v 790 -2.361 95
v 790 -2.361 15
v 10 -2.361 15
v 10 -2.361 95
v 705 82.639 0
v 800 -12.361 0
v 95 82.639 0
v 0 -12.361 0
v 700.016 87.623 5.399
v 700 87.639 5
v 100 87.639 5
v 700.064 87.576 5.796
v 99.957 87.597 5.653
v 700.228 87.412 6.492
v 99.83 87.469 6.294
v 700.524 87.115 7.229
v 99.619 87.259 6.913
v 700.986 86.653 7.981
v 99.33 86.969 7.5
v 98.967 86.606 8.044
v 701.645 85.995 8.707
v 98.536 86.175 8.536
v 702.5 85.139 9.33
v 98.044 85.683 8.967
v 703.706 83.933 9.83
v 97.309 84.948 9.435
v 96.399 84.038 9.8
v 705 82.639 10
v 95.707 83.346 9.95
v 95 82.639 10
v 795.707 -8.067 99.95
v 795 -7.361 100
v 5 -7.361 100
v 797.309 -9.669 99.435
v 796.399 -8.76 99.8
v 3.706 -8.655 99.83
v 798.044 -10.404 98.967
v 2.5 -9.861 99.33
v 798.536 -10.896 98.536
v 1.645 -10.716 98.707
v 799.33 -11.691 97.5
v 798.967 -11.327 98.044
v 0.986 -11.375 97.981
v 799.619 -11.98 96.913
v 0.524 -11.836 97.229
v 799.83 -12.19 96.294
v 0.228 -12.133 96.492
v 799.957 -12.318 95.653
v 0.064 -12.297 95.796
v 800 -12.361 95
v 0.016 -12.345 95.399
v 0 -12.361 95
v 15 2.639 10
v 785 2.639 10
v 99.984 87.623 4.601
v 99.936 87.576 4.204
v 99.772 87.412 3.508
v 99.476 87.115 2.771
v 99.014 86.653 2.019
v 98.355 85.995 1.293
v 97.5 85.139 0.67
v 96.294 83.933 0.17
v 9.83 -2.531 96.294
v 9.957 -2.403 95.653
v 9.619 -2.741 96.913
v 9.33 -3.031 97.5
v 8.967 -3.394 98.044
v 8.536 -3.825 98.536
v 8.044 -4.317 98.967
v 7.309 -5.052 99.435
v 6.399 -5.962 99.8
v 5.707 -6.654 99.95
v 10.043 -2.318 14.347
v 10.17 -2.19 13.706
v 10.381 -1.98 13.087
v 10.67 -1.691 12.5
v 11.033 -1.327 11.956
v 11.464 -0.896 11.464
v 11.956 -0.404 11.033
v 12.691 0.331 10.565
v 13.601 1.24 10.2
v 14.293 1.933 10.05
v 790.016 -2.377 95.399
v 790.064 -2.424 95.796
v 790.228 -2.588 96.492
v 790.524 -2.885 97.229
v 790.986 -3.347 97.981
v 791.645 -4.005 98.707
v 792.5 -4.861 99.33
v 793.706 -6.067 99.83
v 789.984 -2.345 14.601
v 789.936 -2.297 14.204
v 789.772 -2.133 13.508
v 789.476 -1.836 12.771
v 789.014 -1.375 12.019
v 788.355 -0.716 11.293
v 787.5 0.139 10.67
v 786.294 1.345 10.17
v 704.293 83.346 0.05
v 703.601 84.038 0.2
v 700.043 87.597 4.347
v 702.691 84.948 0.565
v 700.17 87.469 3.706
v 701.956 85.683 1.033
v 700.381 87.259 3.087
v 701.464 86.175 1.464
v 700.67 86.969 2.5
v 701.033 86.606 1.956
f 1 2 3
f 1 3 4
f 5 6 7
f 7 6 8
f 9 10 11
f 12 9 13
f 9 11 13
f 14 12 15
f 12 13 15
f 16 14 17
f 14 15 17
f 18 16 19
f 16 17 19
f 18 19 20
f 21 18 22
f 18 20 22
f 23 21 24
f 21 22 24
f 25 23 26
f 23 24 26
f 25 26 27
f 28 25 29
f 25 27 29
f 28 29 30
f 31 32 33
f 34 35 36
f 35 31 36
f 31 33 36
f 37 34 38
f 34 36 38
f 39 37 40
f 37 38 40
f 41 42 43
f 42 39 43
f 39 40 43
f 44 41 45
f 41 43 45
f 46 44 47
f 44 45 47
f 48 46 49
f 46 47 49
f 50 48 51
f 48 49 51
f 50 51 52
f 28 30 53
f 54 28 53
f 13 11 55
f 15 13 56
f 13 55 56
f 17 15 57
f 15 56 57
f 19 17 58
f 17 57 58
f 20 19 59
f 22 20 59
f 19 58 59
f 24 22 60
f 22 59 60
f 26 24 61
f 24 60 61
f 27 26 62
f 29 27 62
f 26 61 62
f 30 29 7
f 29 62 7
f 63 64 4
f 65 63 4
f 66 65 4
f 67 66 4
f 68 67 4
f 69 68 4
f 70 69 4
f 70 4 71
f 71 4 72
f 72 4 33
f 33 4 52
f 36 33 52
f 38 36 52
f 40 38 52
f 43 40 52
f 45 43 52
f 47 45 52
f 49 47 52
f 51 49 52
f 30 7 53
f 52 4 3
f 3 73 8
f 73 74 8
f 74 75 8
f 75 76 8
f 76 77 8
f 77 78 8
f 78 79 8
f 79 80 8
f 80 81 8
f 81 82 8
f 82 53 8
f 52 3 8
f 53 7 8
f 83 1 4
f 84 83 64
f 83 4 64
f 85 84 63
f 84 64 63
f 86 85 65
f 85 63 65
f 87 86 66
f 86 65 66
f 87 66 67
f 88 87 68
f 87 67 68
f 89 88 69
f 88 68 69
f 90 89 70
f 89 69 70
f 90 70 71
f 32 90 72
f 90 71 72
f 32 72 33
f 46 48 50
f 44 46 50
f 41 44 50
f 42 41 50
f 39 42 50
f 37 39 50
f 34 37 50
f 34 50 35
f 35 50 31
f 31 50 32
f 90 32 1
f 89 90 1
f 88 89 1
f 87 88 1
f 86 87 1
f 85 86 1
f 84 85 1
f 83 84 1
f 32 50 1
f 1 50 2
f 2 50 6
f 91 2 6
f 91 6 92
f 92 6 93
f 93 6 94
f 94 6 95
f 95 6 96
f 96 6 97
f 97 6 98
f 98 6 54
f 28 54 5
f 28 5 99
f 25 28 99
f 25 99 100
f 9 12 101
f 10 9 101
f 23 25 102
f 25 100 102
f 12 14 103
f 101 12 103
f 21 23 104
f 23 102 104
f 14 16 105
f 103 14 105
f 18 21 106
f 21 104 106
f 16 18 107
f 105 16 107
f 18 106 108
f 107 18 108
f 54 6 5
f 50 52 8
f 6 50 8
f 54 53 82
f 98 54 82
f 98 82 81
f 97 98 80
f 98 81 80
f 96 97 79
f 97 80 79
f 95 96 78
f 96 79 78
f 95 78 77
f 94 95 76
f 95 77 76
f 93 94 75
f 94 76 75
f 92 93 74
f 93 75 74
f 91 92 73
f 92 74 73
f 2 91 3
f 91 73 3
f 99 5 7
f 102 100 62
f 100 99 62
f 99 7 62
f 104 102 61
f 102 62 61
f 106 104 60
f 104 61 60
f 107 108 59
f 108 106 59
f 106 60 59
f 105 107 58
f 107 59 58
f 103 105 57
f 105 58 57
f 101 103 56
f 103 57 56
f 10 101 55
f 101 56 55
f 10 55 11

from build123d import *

# Parameters (mm, degrees)
F1_DEPTH = 800
F3_DEPTH = 100
F5_DEPTH = 100.001


with BuildPart() as f1:
    # F0 (on Right) → F1 (new body)
    with BuildSketch(Plane.YZ):
        with BuildLine():
            Line((-12.360656, 95), (-12.360656, 0))
            Line((-12.360656, 0), (82.639344, 0))
            ThreePointArc((82.639344, 0), (86.174878, 1.464466), (87.639344, 5))
            ThreePointArc((87.639344, 5), (86.174878, 8.535534), (82.639344, 10))
            Line((82.639344, 10), (2.639344, 10))
            ThreePointArc((2.639344, 10), (-0.89619, 11.464466), (-2.360656, 15))
            Line((-2.360656, 15), (-2.360656, 95))
            ThreePointArc((-2.360656, 95), (-3.825122, 98.535534), (-7.360656, 100))
            ThreePointArc((-7.360656, 100), (-10.89619, 98.535534), (-12.360656, 95))
        make_face()
    extrude(amount=F1_DEPTH)

    # F2 (on face) → F3 (cut)
    with BuildSketch(Plane(origin=(0, 0, 0), x_dir=(1, 0, 0), z_dir=(0, 0, -1))):
        Polygon((800, -82.639344), (800, 12.360656), (705, -82.639344), align=None)
        Polygon((800, -87.639344), (800, -82.639344), (705, -82.639344), (700, -87.639344), align=None)
    extrude(amount=-F3_DEPTH, mode=Mode.SUBTRACT)

    # F4 (on face) → F5 (cut, through all)
    with BuildSketch(Plane(origin=(0, 0, 0), x_dir=(1, 0, 0), z_dir=(0, 0, -1))):
        Polygon((95, -82.639344), (0, -82.639344), (0, -87.639344), (100, -87.639344), align=None)
        Polygon((95, -82.639344), (0, 12.360656), (0, -82.639344), align=None)
    extrude(amount=-F5_DEPTH, mode=Mode.SUBTRACT)


solid = f1.part
